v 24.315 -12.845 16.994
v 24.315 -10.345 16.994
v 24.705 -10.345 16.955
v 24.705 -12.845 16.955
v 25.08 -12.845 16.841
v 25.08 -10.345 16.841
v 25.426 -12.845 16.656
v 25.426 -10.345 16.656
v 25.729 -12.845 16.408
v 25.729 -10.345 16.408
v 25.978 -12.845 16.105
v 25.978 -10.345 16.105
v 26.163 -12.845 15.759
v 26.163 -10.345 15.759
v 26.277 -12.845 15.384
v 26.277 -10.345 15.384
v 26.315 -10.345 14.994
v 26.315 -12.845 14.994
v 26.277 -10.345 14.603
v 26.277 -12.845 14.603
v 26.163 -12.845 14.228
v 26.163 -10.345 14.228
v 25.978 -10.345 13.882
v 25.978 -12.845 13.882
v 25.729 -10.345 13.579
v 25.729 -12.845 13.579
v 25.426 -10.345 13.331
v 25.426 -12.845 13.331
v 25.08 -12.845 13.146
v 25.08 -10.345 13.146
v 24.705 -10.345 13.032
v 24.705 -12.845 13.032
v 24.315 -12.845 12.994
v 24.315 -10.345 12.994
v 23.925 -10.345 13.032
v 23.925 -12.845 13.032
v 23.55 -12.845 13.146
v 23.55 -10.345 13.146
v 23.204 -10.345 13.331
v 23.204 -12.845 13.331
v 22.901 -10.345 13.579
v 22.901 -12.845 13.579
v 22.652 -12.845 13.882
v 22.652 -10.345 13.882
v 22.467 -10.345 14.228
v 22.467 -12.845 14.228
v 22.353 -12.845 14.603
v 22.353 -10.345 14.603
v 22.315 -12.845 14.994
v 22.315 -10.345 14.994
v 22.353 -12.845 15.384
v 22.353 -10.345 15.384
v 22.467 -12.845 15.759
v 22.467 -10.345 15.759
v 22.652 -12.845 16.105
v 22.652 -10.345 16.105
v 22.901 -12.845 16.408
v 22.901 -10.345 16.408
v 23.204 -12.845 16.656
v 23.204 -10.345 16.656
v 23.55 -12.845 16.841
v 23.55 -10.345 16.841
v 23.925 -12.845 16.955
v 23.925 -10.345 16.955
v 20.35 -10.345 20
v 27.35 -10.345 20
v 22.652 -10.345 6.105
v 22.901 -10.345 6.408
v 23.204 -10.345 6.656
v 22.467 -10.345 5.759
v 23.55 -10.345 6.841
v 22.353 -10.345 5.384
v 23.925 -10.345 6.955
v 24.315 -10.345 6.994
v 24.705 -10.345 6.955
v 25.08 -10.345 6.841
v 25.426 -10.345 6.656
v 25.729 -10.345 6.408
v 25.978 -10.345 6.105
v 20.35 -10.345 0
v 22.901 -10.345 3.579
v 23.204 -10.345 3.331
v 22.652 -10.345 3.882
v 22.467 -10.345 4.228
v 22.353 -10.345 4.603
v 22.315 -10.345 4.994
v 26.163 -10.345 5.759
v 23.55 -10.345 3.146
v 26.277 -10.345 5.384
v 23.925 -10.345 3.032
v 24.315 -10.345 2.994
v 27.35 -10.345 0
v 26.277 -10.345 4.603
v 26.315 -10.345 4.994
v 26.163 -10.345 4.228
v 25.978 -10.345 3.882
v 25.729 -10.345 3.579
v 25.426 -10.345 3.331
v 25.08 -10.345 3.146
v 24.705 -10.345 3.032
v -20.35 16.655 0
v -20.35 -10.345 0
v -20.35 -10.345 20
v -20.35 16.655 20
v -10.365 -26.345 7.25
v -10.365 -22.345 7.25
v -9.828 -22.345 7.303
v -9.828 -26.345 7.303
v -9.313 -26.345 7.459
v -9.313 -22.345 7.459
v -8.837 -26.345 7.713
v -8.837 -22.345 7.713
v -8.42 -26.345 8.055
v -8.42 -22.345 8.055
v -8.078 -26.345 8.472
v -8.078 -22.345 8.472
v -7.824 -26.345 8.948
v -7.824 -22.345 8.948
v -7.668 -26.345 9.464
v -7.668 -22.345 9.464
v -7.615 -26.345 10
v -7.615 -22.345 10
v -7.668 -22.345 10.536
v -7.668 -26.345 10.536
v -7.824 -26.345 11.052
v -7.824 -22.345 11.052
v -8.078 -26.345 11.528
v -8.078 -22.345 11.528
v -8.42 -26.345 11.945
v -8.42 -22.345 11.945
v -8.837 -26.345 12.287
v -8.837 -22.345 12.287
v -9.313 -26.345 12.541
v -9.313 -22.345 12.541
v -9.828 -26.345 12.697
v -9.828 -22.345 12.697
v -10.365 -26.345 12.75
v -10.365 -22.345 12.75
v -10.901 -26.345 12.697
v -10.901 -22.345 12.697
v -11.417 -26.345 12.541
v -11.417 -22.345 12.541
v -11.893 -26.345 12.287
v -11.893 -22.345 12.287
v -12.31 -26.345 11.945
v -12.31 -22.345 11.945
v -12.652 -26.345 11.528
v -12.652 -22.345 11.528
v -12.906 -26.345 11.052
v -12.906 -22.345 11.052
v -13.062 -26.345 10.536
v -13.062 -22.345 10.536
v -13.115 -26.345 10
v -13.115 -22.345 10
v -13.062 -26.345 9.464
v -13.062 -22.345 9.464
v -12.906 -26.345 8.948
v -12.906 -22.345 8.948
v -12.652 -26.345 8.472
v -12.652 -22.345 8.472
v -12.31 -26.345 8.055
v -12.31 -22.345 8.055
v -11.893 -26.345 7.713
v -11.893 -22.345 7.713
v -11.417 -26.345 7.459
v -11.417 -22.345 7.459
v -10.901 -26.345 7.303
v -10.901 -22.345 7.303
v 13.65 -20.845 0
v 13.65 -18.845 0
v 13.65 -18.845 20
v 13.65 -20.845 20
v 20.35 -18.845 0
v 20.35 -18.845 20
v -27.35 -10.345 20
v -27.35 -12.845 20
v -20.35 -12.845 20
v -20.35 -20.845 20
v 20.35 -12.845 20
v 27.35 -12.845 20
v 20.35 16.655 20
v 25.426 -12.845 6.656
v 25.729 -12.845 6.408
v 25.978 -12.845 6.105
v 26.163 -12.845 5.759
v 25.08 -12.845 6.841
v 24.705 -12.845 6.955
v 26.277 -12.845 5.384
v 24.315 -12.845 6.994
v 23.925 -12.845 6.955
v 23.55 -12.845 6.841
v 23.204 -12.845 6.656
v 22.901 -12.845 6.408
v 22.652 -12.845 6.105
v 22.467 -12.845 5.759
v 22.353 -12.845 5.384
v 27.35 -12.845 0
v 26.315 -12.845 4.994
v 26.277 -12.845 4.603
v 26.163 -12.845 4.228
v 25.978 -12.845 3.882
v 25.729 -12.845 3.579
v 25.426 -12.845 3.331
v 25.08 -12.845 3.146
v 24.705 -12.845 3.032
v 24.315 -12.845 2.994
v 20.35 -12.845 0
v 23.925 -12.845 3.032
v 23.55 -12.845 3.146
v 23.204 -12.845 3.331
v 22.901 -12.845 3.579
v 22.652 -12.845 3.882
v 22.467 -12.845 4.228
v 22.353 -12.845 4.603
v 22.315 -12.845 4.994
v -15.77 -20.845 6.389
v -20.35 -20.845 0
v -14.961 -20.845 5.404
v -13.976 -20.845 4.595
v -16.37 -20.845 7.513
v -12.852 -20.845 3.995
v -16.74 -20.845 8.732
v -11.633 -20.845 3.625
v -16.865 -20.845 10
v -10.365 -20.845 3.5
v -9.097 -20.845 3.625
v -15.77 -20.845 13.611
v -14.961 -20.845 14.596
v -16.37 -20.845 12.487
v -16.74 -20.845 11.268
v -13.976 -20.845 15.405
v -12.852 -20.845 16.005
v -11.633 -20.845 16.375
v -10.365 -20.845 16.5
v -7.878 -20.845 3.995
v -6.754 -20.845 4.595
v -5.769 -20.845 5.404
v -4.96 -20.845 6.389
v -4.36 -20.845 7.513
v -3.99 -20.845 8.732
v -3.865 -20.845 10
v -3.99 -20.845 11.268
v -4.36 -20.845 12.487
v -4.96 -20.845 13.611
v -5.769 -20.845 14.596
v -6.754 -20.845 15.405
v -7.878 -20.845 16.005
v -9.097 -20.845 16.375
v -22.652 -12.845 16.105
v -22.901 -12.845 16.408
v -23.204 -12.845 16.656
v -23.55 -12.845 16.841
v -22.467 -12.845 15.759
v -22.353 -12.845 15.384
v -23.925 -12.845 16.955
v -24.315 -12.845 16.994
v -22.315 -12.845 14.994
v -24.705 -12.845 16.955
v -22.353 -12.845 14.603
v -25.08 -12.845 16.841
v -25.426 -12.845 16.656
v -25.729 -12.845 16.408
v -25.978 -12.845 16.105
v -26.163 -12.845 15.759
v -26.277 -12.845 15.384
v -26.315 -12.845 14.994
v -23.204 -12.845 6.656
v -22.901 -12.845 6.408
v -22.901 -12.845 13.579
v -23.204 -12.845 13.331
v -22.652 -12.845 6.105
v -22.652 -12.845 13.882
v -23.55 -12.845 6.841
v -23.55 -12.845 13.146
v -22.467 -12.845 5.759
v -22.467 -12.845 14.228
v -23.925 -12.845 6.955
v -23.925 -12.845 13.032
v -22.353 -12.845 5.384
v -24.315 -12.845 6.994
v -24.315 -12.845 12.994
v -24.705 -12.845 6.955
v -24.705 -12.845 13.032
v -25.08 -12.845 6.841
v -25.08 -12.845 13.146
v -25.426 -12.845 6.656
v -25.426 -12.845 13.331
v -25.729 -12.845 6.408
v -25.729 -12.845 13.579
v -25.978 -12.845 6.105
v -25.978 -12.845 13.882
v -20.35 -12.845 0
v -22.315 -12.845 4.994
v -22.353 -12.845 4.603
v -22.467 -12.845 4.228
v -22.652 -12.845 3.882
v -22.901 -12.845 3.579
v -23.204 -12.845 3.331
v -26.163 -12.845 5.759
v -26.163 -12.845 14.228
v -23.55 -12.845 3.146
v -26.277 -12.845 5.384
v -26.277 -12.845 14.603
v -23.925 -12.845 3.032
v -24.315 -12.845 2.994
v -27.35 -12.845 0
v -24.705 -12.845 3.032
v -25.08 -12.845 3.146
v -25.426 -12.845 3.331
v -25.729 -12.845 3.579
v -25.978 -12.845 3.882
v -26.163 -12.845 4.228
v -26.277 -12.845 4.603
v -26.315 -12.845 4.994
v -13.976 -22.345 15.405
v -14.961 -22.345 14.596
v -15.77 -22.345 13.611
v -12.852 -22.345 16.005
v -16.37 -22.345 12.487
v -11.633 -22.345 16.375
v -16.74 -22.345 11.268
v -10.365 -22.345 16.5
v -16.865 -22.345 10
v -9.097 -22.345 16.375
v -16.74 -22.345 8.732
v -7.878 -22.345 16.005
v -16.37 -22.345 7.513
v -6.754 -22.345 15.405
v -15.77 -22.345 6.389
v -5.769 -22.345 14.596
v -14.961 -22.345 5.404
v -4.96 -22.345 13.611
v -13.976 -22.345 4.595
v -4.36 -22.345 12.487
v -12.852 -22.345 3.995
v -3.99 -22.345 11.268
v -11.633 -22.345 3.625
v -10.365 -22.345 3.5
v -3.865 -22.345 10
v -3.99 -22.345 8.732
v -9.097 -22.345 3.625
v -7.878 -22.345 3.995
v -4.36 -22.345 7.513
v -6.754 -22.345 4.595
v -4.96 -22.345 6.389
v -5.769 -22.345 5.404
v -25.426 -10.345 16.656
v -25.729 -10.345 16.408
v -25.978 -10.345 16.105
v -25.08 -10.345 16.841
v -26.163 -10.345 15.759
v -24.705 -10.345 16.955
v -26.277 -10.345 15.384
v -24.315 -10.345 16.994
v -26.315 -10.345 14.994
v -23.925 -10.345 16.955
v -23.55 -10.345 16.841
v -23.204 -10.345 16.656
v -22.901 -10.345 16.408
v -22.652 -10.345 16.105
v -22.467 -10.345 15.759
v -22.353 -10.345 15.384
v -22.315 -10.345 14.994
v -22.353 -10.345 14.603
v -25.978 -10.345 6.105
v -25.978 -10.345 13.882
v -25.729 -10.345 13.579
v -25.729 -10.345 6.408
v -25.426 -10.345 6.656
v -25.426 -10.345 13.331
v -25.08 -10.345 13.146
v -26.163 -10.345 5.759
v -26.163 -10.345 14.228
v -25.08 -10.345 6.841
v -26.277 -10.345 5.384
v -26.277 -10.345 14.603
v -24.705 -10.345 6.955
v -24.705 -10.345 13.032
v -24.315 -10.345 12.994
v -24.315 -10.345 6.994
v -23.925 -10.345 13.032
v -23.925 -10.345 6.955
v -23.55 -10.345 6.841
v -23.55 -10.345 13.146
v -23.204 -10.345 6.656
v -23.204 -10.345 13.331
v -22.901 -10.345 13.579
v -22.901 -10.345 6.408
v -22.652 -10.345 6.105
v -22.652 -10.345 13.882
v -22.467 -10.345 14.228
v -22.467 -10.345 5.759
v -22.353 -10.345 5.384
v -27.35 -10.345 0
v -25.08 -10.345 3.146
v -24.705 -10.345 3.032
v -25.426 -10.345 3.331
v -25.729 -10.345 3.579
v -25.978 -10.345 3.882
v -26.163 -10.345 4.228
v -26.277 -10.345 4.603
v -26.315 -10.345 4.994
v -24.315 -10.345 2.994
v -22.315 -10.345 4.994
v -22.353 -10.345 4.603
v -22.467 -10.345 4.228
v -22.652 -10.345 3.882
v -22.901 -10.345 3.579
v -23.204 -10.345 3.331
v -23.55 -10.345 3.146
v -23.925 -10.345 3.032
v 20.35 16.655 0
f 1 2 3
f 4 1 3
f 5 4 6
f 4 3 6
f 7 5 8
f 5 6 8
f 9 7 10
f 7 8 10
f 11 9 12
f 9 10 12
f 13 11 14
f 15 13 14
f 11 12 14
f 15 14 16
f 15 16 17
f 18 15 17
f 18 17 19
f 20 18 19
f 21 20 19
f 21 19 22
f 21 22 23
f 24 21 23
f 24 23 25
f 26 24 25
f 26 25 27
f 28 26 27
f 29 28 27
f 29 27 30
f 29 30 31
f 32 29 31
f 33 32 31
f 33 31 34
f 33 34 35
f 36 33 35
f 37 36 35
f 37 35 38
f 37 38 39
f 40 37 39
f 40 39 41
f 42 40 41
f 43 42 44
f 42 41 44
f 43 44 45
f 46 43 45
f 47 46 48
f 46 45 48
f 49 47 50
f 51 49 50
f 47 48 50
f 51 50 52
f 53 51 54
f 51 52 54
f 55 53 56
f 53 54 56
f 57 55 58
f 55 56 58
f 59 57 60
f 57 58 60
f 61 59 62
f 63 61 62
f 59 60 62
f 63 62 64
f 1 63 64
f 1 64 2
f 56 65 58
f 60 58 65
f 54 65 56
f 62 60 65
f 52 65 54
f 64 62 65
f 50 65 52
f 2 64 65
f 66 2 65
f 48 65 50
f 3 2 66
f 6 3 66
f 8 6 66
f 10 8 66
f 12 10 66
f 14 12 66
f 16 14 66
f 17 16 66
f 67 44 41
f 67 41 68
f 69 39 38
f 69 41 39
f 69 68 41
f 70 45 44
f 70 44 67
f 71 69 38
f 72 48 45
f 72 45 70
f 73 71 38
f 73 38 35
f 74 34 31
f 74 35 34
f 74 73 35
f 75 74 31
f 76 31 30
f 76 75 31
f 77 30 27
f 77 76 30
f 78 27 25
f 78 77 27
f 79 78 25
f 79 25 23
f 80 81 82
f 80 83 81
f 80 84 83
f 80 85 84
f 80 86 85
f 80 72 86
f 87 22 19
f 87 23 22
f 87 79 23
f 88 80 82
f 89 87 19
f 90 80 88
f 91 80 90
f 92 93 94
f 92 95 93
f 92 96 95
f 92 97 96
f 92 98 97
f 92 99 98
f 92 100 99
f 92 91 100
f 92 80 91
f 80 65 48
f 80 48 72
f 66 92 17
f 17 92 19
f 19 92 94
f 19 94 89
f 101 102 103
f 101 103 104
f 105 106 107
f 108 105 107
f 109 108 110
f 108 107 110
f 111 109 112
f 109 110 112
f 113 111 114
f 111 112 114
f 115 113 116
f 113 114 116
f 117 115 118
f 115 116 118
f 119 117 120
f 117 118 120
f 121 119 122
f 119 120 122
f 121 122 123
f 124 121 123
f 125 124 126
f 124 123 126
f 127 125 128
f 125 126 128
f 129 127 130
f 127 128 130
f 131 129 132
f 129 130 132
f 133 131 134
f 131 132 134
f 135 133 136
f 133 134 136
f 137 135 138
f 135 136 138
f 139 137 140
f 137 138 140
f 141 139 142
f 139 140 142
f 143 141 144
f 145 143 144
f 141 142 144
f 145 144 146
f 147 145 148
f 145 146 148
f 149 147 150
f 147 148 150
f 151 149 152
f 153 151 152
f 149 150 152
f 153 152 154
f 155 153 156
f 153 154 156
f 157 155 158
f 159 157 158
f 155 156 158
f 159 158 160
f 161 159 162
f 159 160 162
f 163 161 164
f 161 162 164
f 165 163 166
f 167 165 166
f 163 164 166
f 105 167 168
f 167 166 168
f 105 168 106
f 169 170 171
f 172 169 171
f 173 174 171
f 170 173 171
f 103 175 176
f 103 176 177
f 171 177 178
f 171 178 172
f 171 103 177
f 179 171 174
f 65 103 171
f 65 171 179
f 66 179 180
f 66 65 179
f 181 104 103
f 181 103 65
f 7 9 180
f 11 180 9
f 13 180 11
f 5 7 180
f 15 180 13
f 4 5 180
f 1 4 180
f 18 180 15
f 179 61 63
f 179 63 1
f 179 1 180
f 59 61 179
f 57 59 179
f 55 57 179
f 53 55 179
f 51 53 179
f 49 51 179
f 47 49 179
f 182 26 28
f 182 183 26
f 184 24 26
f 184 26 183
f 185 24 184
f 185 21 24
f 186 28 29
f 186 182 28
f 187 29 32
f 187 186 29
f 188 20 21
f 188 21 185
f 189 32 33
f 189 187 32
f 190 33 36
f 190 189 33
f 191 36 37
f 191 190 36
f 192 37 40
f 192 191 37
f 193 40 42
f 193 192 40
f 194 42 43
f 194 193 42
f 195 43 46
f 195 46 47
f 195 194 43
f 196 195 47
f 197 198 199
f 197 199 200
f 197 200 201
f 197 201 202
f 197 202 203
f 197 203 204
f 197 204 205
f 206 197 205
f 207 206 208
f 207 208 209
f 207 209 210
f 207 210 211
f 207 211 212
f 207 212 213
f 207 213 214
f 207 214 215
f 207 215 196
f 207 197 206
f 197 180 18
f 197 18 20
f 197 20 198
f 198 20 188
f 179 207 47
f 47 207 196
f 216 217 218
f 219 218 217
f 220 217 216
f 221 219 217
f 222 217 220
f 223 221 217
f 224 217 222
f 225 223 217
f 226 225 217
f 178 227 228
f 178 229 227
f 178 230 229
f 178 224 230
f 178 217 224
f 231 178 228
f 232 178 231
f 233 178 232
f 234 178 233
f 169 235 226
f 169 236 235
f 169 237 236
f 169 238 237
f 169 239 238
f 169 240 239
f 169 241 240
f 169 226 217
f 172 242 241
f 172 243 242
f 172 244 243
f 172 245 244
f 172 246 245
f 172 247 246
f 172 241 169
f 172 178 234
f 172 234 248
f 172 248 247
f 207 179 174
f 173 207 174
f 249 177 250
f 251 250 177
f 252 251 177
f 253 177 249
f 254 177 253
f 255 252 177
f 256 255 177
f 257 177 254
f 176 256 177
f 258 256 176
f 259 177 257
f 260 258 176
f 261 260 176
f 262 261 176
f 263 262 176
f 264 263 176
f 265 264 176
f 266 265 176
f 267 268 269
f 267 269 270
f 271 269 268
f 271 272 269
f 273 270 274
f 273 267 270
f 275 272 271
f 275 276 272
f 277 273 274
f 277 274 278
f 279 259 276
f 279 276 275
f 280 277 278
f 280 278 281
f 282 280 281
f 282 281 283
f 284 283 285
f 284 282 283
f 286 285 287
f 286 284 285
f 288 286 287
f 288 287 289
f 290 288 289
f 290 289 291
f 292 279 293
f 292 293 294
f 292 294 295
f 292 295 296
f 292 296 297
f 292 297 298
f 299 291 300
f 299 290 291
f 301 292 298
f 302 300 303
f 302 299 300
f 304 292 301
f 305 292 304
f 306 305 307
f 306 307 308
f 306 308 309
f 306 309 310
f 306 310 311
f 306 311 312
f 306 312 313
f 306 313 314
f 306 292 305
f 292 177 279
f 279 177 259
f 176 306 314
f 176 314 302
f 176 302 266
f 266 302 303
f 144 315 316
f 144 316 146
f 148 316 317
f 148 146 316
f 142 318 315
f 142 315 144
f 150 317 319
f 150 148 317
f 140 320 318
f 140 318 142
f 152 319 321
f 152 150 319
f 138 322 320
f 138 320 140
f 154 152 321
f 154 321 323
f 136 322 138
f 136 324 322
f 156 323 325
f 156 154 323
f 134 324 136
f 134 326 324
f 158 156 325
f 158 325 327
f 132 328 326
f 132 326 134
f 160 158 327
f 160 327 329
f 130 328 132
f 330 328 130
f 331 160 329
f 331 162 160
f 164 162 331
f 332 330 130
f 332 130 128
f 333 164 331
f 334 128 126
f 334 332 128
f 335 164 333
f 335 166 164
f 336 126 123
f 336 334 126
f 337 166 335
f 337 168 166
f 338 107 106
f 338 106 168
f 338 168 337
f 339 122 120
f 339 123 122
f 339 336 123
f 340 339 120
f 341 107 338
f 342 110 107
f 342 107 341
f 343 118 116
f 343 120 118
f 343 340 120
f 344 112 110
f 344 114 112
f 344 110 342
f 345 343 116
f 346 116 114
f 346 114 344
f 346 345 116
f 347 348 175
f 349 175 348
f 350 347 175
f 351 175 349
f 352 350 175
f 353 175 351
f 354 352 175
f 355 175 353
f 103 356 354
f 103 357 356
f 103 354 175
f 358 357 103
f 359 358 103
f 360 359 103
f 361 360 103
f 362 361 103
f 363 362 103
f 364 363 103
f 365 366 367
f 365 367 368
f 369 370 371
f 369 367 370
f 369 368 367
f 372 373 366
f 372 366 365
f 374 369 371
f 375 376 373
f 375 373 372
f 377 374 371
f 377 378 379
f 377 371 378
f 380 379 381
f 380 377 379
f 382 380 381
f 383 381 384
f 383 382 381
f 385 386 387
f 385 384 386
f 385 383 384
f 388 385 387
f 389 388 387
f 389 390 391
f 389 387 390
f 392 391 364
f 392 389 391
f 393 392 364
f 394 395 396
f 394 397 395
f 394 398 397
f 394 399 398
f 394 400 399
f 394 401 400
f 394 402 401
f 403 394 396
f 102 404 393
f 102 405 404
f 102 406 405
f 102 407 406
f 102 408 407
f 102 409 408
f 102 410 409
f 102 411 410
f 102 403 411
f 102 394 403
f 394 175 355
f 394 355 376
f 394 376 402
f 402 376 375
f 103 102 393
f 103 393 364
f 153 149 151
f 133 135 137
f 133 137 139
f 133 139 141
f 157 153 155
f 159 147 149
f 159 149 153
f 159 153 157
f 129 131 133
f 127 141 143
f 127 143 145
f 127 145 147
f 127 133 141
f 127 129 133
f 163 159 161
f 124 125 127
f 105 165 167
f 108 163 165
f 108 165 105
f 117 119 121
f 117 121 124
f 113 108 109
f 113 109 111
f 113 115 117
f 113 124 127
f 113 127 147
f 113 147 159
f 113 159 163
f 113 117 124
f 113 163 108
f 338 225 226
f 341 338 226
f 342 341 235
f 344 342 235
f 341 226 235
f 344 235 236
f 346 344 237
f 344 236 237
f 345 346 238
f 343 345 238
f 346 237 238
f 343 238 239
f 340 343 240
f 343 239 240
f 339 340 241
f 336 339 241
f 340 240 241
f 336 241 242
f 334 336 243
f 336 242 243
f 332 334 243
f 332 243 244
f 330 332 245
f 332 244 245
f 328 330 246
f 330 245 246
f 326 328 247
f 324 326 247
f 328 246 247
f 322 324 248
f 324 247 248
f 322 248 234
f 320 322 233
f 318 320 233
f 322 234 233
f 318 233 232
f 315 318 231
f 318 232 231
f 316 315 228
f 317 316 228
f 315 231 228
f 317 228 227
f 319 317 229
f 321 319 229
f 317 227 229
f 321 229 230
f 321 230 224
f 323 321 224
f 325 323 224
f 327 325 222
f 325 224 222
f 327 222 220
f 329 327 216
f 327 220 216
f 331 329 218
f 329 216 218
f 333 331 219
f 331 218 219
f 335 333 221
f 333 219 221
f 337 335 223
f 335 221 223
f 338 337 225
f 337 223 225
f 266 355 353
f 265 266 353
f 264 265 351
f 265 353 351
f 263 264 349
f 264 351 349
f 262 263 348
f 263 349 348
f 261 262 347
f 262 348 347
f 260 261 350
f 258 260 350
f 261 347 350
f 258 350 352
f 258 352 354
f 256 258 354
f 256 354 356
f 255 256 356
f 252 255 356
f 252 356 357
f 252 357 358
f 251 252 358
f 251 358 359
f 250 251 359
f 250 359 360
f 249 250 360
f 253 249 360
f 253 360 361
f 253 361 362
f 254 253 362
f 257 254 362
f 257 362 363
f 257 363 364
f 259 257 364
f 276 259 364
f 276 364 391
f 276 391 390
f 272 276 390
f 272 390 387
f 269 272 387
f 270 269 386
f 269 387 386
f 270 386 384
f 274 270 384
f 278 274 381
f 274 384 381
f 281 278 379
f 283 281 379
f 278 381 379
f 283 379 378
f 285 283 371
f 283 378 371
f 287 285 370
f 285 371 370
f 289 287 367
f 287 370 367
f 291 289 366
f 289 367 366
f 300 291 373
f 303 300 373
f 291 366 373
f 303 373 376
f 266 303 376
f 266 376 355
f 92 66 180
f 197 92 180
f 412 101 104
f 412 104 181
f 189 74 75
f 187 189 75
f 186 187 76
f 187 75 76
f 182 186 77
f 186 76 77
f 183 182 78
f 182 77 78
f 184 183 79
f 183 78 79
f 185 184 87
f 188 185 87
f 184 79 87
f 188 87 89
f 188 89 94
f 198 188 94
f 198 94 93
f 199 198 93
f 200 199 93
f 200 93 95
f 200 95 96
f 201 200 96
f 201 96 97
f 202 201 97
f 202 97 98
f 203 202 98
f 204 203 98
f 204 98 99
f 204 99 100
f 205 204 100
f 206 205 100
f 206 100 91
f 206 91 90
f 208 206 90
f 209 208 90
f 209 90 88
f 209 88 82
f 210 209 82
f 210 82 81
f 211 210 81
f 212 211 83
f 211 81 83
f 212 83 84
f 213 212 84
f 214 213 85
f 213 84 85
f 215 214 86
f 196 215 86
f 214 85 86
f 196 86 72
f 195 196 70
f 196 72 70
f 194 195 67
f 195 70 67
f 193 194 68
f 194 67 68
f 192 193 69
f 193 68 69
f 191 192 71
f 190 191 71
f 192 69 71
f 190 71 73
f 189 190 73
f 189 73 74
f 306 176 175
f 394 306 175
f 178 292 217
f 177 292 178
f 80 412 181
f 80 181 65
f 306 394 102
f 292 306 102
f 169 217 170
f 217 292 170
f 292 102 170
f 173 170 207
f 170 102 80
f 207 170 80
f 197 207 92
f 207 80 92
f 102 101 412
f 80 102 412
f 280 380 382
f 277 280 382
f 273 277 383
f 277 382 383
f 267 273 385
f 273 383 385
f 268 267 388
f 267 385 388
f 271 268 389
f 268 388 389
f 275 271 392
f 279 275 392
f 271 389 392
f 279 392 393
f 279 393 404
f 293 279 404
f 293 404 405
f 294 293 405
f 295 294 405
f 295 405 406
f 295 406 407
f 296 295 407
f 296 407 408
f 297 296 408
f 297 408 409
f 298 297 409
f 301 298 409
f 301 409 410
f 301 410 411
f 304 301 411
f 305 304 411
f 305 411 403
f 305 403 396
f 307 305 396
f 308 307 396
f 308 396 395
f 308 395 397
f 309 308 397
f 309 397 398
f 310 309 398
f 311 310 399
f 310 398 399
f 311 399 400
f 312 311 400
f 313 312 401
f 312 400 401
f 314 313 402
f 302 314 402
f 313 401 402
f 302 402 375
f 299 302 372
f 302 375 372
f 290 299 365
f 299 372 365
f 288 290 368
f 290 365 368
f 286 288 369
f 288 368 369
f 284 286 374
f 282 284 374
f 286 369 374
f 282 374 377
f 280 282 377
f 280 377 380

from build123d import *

# Parameters (mm, degrees)
EXTRUDE_1_DEPTH     = 20
SKETCH_4_W          = 34
SKETCH_4_H          = 20
EXTRUDE_2_DEPTH     = 2
SKETCH_5_R          = 6.5
EXTRUDE_3_DEPTH     = 1.5
SKETCH_6_R          = 2.75
EXTRUDE_4_DEPTH     = 4
SKETCH_7_R          = 2
CUT_EXTRUDE_1_DEPTH = 44.324617713


with BuildPart() as part:
    # 草图3 → 凸台-拉伸1 (new body)
    with BuildSketch(Plane.XY):
        Polygon((-20.35, 16.655405405), (20.35, 16.655405405), (20.35, -10.344594595), (27.35, -10.344594595), (27.35, -12.844594595), (20.35, -12.844594595), (20.35, -18.844594595), (-20.35, -18.844594595), (-20.35, -12.844594595), (-27.35, -12.844594595), (-27.35, -10.344594595), (-20.35, -10.344594595), align=None)
    extrude(amount=EXTRUDE_1_DEPTH)

    # 草图4 → 凸台-拉伸2 (add)
    with BuildSketch(Plane.XZ.offset(18.844594595)):
        with Locations((-3.35, 10)):
            Rectangle(SKETCH_4_W, SKETCH_4_H)
    extrude(amount=EXTRUDE_2_DEPTH)

    # 草图5 → 凸台-拉伸3 (add)
    with BuildSketch(Plane.XZ.offset(20.844594595)):
        with Locations(Location((-10.364971528, 10, 0), (0, 0, 270))):
            Circle(SKETCH_5_R)
    extrude(amount=EXTRUDE_3_DEPTH)

    # 草图6 → 凸台-拉伸4 (add)
    with BuildSketch(Plane.XZ.offset(22.344594595)):
        with Locations(Location((-10.364971528, 10, 0), (0, 0, 270))):
            Circle(SKETCH_6_R)
    extrude(amount=EXTRUDE_4_DEPTH)

    # 草图7 → 切除-拉伸1 (cut, through all)
    with BuildSketch(Plane(origin=(0, -10.344594595, 0), x_dir=(1, 0, 0), z_dir=(0, 1, 0))):
        with Locations(Location((-24.315, -4.993540971, 0), (0, 0, 270))):
            Circle(SKETCH_7_R)
        with Locations(Location((24.315, -4.993540971, 0), (0, 0, 270))):
            Circle(SKETCH_7_R)
        with Locations(Location((24.315, -14.993540971, 0), (0, 0, 270))):
            Circle(SKETCH_7_R)
        with Locations(Location((-24.315, -14.993540971, 0), (0, 0, 180))):
            Circle(SKETCH_7_R)
    extrude(amount=-CUT_EXTRUDE_1_DEPTH, mode=Mode.SUBTRACT)


solid = part.part
